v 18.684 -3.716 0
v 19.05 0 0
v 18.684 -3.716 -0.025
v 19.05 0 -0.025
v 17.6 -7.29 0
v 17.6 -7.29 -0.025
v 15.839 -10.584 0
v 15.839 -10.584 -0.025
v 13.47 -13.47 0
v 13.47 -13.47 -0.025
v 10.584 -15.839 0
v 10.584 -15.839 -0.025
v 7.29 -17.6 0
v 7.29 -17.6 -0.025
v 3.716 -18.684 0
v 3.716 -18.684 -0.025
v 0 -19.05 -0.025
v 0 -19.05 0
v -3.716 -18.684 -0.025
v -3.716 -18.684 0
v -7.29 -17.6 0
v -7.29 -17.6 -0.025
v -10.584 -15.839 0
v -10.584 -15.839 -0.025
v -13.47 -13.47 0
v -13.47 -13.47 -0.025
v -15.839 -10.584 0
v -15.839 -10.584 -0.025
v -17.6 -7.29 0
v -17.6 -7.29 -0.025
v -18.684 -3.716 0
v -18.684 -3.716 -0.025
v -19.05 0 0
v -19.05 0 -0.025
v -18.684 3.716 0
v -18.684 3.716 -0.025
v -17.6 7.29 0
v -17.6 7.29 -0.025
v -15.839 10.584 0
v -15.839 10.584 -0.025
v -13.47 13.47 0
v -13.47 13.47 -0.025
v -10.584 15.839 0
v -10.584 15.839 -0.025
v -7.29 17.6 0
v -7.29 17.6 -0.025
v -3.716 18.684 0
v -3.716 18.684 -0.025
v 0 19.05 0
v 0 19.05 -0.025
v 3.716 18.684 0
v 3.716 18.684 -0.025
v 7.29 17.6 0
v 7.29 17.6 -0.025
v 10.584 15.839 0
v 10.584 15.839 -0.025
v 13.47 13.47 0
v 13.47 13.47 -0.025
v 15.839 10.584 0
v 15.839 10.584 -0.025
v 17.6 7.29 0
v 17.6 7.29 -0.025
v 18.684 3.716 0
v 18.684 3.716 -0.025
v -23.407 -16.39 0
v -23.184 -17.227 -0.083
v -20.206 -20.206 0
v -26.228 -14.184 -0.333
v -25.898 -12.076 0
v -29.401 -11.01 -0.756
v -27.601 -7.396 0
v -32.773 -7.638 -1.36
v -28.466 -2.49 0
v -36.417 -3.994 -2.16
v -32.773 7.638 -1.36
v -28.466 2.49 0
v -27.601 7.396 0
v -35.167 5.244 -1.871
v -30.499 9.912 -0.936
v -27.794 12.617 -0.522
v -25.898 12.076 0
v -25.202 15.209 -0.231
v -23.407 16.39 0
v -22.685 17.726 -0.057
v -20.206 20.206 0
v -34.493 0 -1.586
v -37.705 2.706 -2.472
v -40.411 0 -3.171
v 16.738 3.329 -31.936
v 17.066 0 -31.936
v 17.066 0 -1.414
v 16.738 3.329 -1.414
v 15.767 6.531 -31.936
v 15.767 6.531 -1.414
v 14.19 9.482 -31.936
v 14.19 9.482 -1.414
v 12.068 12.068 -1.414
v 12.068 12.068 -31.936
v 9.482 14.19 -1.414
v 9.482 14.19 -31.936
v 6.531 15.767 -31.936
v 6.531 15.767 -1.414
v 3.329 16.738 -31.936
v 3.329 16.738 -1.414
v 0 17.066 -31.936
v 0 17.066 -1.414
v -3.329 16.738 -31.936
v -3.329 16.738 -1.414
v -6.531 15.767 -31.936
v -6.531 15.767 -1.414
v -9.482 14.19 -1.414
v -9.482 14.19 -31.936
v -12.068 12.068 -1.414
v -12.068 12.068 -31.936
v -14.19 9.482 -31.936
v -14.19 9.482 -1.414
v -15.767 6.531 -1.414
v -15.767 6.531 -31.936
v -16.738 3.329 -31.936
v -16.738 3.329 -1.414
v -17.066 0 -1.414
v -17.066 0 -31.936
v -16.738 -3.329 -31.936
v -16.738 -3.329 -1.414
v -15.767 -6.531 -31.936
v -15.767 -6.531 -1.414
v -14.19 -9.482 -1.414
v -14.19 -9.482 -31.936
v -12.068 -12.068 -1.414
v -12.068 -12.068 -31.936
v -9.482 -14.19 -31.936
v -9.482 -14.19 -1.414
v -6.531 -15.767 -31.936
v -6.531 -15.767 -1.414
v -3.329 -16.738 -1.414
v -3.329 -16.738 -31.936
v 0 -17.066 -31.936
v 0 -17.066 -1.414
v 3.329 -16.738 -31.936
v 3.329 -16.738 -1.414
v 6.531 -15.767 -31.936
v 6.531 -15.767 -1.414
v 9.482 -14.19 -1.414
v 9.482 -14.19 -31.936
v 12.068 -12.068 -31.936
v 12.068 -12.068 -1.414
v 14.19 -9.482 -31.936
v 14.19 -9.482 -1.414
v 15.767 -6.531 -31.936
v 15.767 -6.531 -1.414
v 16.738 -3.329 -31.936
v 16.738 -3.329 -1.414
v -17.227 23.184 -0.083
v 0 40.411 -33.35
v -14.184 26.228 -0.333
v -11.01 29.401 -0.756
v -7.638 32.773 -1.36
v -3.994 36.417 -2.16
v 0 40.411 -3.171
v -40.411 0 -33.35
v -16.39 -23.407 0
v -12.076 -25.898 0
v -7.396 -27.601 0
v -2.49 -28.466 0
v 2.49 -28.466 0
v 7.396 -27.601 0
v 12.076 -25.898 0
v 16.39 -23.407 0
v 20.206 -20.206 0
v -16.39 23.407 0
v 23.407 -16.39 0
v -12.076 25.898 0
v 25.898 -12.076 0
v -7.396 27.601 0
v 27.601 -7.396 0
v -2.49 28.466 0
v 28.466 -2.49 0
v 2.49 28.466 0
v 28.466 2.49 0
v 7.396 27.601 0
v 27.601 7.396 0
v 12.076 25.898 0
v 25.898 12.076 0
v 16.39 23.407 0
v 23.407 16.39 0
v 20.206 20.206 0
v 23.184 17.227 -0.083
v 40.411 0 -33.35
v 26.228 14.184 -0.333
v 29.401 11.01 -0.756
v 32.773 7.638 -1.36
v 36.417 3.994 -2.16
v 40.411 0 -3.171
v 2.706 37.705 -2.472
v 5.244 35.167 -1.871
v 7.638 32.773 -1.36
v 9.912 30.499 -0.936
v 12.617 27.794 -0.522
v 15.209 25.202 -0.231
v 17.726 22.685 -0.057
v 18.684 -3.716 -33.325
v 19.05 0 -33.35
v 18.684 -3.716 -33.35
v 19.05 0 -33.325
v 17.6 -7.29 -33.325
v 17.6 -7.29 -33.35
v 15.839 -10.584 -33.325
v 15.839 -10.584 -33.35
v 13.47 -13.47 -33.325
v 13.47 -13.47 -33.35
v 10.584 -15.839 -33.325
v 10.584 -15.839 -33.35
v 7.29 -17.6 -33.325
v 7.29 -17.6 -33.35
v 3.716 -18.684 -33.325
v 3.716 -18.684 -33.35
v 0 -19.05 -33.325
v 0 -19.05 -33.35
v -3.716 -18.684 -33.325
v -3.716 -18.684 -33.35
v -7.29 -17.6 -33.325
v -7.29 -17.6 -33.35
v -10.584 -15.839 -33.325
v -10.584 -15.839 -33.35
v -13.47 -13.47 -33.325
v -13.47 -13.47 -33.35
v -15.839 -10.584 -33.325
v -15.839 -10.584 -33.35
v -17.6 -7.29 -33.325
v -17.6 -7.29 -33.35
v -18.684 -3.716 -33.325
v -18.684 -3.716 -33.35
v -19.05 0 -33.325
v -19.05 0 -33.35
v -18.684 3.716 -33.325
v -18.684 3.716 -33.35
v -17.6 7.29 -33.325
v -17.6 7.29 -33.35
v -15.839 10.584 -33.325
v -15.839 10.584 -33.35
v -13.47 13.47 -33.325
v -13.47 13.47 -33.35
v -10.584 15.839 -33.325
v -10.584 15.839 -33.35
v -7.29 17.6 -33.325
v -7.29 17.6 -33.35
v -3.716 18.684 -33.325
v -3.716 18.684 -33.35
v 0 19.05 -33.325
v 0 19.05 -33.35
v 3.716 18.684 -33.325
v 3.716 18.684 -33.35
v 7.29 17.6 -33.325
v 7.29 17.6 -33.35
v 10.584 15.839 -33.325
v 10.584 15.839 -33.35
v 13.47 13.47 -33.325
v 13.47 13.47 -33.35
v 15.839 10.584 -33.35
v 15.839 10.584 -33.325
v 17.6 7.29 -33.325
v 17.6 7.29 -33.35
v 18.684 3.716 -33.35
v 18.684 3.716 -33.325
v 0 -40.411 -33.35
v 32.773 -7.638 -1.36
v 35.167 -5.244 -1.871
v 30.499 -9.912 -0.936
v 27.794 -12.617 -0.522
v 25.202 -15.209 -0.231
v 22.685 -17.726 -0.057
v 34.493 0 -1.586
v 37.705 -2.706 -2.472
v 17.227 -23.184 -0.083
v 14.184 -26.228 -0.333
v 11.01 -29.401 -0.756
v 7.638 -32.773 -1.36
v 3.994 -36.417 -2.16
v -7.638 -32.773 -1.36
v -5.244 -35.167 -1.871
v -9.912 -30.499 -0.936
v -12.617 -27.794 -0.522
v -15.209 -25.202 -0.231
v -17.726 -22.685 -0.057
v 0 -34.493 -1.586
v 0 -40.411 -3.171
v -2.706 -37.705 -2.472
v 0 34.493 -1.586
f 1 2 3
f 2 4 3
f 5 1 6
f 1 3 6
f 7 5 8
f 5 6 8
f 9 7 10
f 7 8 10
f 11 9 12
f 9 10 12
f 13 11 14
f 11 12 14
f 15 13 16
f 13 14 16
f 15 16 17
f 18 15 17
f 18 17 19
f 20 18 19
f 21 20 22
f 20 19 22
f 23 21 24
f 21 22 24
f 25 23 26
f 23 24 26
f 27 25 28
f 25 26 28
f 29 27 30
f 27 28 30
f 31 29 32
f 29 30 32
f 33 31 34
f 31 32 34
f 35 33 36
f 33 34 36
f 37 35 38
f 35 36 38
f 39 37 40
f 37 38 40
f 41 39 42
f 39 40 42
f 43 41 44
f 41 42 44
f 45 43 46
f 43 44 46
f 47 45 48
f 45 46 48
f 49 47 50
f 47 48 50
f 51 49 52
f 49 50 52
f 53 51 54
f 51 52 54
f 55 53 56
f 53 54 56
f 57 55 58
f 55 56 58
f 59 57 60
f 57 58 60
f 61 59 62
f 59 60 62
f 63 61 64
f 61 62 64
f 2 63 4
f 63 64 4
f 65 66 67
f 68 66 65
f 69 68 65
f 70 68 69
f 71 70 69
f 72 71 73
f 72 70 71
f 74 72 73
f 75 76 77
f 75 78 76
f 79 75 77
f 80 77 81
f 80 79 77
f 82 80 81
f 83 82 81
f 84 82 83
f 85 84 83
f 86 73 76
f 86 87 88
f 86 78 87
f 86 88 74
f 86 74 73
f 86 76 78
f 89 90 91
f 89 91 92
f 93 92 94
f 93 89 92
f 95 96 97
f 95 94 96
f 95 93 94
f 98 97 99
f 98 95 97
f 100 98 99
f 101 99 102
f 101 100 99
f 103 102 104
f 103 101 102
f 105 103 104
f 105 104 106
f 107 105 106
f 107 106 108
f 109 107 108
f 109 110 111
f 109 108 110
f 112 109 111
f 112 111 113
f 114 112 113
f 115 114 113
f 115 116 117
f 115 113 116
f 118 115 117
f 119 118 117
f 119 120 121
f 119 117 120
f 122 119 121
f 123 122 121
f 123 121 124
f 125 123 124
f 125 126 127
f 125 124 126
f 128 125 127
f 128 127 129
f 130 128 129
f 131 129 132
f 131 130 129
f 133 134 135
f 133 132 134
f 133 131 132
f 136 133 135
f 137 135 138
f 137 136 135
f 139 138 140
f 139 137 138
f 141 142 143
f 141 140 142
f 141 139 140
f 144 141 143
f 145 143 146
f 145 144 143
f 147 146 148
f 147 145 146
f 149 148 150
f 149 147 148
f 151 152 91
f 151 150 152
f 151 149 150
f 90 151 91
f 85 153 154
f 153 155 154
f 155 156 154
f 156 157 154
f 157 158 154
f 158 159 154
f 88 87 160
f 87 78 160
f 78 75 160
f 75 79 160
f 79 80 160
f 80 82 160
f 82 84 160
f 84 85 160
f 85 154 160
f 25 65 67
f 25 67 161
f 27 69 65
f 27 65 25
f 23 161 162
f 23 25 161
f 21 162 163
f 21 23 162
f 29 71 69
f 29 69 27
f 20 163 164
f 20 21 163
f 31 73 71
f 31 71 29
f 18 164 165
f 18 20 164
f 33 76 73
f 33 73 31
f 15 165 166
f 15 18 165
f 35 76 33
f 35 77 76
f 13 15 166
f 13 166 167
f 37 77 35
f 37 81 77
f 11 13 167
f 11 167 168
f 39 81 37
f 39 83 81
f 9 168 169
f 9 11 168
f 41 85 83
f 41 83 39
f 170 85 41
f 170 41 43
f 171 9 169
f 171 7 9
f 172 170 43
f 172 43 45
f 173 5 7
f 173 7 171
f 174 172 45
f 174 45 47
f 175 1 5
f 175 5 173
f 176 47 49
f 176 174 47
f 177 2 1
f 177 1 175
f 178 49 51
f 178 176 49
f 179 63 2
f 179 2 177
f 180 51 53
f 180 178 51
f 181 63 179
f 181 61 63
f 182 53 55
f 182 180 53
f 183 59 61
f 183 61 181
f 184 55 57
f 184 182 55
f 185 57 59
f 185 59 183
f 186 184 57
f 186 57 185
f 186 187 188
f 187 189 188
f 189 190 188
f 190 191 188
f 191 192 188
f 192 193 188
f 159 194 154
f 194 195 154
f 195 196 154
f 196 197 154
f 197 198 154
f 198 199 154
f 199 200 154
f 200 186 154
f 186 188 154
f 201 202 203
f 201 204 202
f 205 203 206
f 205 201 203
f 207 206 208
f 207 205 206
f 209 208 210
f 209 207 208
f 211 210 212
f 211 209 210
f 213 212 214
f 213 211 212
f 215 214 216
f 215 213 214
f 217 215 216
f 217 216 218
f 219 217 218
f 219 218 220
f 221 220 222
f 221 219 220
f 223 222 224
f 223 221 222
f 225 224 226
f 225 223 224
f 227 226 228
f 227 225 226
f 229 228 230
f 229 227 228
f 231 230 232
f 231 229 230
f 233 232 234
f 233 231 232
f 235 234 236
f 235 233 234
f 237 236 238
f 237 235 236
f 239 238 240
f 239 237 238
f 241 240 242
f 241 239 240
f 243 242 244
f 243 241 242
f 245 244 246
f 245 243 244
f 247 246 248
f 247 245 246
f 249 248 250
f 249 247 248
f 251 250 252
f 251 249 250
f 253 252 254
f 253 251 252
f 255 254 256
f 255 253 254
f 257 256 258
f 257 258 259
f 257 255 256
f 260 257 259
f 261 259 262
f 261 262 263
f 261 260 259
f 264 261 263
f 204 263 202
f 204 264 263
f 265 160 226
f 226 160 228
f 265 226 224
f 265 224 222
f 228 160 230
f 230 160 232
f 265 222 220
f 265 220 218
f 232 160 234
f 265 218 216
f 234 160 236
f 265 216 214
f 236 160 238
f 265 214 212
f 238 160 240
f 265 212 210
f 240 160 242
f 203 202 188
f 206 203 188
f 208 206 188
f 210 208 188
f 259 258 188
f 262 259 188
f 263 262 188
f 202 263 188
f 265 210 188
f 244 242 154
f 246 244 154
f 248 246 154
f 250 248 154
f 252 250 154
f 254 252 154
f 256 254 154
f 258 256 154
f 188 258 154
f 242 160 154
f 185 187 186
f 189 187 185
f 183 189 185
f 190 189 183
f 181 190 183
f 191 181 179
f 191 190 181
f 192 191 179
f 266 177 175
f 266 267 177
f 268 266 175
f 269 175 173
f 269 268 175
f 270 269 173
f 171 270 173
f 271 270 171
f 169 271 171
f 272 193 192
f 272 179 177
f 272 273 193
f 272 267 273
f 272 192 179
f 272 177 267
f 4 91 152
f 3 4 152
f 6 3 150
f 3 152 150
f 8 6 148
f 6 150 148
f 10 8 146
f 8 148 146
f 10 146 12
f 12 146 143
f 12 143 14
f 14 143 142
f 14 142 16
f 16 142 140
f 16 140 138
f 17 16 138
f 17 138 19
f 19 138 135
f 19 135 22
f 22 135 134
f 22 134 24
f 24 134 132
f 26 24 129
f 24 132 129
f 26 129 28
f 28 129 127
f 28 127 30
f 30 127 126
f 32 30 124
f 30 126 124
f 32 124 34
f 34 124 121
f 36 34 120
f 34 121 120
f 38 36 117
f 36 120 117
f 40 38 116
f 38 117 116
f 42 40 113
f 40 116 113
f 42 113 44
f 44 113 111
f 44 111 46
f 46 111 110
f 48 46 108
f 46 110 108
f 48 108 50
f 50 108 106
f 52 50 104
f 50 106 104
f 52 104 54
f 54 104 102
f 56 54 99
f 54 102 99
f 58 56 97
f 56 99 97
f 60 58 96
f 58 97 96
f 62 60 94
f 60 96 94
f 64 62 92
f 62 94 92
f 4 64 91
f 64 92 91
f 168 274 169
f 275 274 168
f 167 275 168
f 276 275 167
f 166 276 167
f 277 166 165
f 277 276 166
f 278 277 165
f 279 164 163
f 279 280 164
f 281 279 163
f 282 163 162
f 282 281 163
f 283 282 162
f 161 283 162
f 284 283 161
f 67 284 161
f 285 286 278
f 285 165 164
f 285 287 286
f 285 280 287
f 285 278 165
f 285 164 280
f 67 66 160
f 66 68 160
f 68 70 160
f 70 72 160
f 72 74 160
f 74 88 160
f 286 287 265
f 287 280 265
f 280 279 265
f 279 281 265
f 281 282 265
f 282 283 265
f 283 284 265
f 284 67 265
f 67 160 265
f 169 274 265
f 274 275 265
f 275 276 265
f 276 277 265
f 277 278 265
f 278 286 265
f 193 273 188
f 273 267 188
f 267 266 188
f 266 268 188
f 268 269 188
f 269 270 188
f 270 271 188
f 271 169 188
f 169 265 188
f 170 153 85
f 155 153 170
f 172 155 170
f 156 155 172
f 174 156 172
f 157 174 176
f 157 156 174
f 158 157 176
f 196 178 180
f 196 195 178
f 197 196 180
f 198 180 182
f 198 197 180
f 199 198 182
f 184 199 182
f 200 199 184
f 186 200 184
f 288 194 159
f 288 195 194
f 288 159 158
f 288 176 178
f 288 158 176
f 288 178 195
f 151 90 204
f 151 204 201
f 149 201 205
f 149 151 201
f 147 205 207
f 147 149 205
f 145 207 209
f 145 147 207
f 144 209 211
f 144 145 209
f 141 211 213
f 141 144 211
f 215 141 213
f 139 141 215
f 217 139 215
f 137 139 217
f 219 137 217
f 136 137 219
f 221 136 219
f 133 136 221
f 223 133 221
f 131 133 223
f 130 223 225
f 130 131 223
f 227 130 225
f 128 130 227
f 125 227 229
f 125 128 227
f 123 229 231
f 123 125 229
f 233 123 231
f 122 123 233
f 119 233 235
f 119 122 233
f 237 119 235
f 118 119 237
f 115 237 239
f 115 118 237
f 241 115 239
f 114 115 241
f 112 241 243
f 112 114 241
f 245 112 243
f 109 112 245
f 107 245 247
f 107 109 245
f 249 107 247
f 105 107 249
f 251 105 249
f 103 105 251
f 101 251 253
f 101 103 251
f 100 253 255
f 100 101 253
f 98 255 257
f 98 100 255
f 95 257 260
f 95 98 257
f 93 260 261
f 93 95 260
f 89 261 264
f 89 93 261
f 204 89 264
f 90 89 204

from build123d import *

# Parameters (mm, degrees)
BASENUT_START = -33.3502
BASENUTSKE_R  = 17.06626
BASENUT_DEPTH = 33.3502


with BuildPart() as part:
    # BaseNutSke → BaseNut (new body)
    with BuildSketch(Plane.XY.offset(BASENUT_START)):
        Polygon((40.411152545, 0), (0, 40.411152545), (-40.411152545, 0), (0, -40.411152545), align=None)
        Circle(BASENUTSKE_R, mode=Mode.SUBTRACT)
    extrude(amount=BASENUT_DEPTH)

    # EndChamferSketch → EndChamfer (revolve, cut)
    with BuildSketch(Plane(origin=(0, 0, 0), x_dir=(0, 0, -1), z_dir=(1, 0, 0)), mode=Mode.PRIVATE) as endchamfer_sk:
        Polygon((33.3248, 19.05), (31.797434837, 16.867886), (33.3502, 16.867886), (33.3502, 19.05), align=None)
        Polygon((0, 19.05), (0.0254, 19.05), (1.552765163, 16.867886), (0, 16.867886), align=None)
    revolve(endchamfer_sk.sketch.rotate(Axis((0, 0, -25.037505729), (0, 0, -1)), 90), axis=Axis((0, 0, -25.037505729), (0, 0, -1)), mode=Mode.SUBTRACT)

    # Sketch2 → Single-Chamfer (revolve, cut)
    with BuildSketch(Plane(origin=(0, 0, 0), x_dir=(0, 0, -1), z_dir=(1, 0, 0))):
        Polygon((-12.7, 28.575), (0, 28.575), (6.57444226, 53.111152545), (-12.7, 53.111152545), align=None)
    revolve(axis=Axis((0, 0, 0), (0, 0, -1)), mode=Mode.SUBTRACT)


solid = part.part
